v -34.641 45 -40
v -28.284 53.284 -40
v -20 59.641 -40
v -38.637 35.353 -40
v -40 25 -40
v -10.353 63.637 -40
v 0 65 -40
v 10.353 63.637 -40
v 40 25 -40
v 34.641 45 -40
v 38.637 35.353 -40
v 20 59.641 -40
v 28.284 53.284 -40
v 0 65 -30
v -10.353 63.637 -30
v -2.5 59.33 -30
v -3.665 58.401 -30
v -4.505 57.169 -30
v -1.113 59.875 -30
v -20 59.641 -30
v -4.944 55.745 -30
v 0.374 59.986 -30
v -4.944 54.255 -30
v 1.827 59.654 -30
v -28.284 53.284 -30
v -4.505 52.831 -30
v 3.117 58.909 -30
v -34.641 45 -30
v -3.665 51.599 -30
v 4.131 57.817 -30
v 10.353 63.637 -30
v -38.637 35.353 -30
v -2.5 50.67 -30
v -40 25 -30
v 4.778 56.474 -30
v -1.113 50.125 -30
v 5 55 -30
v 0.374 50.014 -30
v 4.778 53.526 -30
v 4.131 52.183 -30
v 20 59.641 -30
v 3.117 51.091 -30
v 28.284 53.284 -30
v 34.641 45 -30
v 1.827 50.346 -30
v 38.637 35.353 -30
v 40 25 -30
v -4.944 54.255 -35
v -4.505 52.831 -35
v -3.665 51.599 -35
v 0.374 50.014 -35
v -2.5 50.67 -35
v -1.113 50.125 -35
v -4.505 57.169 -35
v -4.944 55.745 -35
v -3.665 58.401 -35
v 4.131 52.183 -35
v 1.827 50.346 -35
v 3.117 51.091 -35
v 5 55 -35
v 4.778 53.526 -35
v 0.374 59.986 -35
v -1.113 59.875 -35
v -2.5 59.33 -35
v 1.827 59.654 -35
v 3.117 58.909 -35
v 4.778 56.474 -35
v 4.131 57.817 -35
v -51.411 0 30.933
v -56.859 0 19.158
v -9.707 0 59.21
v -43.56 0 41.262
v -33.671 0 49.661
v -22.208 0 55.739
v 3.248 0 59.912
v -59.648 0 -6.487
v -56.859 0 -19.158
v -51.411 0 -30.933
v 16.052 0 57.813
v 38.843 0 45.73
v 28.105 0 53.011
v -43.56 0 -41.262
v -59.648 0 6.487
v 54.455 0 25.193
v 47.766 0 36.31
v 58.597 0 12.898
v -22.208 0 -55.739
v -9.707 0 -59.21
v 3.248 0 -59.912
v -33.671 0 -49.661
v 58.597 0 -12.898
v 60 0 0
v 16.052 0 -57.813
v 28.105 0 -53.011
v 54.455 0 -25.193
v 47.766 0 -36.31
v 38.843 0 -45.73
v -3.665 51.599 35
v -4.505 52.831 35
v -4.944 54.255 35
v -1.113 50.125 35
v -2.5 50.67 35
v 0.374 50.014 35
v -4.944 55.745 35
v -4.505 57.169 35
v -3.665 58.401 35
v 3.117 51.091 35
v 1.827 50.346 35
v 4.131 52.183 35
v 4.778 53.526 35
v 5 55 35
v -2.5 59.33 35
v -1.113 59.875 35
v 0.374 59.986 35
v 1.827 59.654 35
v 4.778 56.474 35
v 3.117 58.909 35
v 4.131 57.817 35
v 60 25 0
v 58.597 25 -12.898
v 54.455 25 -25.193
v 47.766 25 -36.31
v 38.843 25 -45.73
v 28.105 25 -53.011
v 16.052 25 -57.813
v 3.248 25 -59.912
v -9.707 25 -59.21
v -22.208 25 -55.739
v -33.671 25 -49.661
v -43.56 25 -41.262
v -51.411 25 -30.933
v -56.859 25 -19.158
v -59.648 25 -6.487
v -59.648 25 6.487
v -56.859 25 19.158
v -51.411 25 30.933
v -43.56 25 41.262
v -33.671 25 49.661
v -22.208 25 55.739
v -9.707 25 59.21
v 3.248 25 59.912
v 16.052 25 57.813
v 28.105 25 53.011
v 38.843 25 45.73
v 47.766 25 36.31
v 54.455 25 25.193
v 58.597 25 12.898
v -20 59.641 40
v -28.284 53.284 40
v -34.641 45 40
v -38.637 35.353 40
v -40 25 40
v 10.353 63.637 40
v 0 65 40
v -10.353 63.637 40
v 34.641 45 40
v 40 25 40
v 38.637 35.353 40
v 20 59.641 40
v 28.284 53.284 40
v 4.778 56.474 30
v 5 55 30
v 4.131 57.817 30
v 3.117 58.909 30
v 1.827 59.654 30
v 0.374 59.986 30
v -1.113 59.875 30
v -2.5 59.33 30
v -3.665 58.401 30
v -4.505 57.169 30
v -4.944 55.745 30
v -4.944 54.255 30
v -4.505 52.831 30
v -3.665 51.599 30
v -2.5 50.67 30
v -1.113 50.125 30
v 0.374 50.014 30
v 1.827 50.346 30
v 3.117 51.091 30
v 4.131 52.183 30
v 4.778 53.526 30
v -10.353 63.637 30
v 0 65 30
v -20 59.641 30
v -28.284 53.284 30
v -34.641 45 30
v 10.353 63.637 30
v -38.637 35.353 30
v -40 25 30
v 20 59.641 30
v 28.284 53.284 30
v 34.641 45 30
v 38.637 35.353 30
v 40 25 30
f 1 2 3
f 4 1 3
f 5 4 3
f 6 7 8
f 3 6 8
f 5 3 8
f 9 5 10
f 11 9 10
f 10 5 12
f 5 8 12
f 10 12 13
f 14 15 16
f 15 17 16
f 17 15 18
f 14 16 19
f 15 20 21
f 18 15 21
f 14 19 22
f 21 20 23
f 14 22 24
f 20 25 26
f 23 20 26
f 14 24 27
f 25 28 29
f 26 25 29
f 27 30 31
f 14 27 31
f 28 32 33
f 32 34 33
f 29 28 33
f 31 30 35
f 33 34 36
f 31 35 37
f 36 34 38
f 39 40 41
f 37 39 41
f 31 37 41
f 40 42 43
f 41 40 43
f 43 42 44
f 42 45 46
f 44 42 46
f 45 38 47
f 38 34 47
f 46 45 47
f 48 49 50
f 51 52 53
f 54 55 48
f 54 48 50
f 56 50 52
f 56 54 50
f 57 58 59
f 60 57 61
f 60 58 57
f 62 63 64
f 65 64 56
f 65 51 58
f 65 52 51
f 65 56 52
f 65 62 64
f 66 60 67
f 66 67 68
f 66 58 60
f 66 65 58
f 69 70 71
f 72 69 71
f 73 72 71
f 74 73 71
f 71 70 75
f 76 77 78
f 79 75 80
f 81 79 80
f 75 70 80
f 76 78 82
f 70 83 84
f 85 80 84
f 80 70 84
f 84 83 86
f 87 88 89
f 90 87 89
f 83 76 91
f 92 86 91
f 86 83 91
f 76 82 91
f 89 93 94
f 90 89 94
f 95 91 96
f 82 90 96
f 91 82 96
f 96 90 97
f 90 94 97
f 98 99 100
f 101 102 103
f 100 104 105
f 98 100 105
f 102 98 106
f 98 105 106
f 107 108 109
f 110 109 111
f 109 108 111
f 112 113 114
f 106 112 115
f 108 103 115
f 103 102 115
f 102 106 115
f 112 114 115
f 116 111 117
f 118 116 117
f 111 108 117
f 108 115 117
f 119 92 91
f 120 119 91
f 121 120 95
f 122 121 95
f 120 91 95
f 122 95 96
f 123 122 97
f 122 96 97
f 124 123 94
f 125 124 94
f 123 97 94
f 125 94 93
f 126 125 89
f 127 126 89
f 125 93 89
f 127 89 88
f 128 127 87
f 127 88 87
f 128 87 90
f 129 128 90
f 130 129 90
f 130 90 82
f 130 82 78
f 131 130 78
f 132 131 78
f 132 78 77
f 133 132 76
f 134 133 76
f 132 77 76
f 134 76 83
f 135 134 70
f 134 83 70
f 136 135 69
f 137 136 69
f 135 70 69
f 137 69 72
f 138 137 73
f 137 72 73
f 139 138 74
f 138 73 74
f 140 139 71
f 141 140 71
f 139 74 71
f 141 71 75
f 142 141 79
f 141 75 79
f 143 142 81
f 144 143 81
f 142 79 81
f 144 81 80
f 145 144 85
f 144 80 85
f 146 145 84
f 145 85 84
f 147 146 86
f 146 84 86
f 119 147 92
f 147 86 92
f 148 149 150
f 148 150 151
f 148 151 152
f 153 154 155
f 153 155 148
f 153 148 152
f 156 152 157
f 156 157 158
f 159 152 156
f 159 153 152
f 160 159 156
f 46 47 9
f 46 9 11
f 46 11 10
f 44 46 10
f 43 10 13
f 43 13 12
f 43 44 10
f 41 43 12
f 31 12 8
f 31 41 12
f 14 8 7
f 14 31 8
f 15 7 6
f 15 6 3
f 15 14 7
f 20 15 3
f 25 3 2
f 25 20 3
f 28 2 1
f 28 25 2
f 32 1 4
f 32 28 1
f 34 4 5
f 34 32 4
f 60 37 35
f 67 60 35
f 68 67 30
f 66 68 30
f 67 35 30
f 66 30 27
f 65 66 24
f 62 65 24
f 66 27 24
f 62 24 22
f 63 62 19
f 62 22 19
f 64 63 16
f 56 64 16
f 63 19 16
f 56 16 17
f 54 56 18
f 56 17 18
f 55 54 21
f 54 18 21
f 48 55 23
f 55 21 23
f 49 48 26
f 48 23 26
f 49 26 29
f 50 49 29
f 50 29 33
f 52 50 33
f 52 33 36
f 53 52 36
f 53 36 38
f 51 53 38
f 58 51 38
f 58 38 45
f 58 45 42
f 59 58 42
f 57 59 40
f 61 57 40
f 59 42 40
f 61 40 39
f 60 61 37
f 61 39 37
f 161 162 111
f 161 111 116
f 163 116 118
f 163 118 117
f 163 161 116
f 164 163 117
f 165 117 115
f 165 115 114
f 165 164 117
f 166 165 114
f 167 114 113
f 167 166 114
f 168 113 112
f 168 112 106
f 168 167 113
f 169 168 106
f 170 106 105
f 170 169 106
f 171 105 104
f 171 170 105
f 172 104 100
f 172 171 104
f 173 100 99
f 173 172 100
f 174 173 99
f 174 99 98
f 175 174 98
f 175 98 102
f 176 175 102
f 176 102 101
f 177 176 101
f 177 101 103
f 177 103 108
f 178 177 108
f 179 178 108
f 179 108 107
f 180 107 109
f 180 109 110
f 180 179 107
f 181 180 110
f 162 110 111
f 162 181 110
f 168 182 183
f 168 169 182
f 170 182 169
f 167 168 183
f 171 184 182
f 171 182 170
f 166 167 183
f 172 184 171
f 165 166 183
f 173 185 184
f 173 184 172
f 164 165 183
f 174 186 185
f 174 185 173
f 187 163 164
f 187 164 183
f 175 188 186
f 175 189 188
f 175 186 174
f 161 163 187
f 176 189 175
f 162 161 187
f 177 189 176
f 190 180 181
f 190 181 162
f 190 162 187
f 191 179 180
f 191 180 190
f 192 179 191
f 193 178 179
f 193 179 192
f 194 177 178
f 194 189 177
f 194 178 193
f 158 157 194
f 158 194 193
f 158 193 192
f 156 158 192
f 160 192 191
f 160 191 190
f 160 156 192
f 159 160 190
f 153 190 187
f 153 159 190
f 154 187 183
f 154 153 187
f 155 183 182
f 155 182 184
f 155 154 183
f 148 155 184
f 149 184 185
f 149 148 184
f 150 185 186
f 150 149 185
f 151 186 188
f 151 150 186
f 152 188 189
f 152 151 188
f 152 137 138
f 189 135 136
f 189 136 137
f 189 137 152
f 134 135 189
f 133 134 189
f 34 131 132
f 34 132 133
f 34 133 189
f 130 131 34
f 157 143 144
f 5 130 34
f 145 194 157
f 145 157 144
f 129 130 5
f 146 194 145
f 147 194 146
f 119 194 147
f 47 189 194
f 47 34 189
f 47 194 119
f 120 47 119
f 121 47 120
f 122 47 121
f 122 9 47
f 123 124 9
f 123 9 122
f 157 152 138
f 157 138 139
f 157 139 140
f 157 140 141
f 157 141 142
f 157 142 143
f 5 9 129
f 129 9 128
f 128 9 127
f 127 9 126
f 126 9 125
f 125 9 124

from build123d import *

# Parameters (mm, degrees)
SKETCH1_R           = 60
BOSS_EXTRUDE1_DEPTH = 25
BOSS_EXTRUDE2_DEPTH = 40
SKETCH3_W           = 80
SKETCH3_H           = 60
CUT_EXTRUDE1_DEPTH  = 60
SKETCH4_R           = 5
CUT_EXTRUDE2_DEPTH  = 5


with BuildPart() as part:
    # Sketch1 → Boss-Extrude1 (new body)
    with BuildSketch(Plane(origin=(0, 0, 0), x_dir=(1, 0, 0), z_dir=(0, 1, 0))):
        Circle(SKETCH1_R)
    extrude(amount=BOSS_EXTRUDE1_DEPTH)

    # Sketch2 → Boss-Extrude2 (add)
    with BuildSketch(Plane.XY):
        with BuildLine():
            Line((-40, 25), (0, 25))
            Line((0, 25), (40, 25))
            ThreePointArc((40, 25), (0, 65), (-40, 25))
        make_face()
    boss_extrude2 = extrude(amount=BOSS_EXTRUDE2_DEPTH)

    # Mirror1: Boss-Extrude2 across plane
    add(boss_extrude2.mirror(Plane(origin=(0, 0, 0), x_dir=(1, 0, 0), z_dir=(0, 0, -1))))

    # Sketch3 → Cut-Extrude1 (cut)
    with BuildSketch(Plane(origin=(0, 25, 0), x_dir=(1, 0, 0), z_dir=(0, 1, 0))):
        Rectangle(SKETCH3_W, SKETCH3_H)
    extrude(amount=CUT_EXTRUDE1_DEPTH, mode=Mode.SUBTRACT)

    # Sketch4 → Cut-Extrude2 (cut)
    with BuildSketch(Plane.XY.offset(-30)):
        with Locations((0, 55)):
            Circle(SKETCH4_R)
    cut_extrude2 = extrude(amount=-CUT_EXTRUDE2_DEPTH, mode=Mode.SUBTRACT)

    # Mirror2: Cut-Extrude2 across plane
    add(cut_extrude2.mirror(Plane(origin=(0, 0, 0), x_dir=(1, 0, 0), z_dir=(0, 0, -1))), mode=Mode.SUBTRACT)


solid = part.part
